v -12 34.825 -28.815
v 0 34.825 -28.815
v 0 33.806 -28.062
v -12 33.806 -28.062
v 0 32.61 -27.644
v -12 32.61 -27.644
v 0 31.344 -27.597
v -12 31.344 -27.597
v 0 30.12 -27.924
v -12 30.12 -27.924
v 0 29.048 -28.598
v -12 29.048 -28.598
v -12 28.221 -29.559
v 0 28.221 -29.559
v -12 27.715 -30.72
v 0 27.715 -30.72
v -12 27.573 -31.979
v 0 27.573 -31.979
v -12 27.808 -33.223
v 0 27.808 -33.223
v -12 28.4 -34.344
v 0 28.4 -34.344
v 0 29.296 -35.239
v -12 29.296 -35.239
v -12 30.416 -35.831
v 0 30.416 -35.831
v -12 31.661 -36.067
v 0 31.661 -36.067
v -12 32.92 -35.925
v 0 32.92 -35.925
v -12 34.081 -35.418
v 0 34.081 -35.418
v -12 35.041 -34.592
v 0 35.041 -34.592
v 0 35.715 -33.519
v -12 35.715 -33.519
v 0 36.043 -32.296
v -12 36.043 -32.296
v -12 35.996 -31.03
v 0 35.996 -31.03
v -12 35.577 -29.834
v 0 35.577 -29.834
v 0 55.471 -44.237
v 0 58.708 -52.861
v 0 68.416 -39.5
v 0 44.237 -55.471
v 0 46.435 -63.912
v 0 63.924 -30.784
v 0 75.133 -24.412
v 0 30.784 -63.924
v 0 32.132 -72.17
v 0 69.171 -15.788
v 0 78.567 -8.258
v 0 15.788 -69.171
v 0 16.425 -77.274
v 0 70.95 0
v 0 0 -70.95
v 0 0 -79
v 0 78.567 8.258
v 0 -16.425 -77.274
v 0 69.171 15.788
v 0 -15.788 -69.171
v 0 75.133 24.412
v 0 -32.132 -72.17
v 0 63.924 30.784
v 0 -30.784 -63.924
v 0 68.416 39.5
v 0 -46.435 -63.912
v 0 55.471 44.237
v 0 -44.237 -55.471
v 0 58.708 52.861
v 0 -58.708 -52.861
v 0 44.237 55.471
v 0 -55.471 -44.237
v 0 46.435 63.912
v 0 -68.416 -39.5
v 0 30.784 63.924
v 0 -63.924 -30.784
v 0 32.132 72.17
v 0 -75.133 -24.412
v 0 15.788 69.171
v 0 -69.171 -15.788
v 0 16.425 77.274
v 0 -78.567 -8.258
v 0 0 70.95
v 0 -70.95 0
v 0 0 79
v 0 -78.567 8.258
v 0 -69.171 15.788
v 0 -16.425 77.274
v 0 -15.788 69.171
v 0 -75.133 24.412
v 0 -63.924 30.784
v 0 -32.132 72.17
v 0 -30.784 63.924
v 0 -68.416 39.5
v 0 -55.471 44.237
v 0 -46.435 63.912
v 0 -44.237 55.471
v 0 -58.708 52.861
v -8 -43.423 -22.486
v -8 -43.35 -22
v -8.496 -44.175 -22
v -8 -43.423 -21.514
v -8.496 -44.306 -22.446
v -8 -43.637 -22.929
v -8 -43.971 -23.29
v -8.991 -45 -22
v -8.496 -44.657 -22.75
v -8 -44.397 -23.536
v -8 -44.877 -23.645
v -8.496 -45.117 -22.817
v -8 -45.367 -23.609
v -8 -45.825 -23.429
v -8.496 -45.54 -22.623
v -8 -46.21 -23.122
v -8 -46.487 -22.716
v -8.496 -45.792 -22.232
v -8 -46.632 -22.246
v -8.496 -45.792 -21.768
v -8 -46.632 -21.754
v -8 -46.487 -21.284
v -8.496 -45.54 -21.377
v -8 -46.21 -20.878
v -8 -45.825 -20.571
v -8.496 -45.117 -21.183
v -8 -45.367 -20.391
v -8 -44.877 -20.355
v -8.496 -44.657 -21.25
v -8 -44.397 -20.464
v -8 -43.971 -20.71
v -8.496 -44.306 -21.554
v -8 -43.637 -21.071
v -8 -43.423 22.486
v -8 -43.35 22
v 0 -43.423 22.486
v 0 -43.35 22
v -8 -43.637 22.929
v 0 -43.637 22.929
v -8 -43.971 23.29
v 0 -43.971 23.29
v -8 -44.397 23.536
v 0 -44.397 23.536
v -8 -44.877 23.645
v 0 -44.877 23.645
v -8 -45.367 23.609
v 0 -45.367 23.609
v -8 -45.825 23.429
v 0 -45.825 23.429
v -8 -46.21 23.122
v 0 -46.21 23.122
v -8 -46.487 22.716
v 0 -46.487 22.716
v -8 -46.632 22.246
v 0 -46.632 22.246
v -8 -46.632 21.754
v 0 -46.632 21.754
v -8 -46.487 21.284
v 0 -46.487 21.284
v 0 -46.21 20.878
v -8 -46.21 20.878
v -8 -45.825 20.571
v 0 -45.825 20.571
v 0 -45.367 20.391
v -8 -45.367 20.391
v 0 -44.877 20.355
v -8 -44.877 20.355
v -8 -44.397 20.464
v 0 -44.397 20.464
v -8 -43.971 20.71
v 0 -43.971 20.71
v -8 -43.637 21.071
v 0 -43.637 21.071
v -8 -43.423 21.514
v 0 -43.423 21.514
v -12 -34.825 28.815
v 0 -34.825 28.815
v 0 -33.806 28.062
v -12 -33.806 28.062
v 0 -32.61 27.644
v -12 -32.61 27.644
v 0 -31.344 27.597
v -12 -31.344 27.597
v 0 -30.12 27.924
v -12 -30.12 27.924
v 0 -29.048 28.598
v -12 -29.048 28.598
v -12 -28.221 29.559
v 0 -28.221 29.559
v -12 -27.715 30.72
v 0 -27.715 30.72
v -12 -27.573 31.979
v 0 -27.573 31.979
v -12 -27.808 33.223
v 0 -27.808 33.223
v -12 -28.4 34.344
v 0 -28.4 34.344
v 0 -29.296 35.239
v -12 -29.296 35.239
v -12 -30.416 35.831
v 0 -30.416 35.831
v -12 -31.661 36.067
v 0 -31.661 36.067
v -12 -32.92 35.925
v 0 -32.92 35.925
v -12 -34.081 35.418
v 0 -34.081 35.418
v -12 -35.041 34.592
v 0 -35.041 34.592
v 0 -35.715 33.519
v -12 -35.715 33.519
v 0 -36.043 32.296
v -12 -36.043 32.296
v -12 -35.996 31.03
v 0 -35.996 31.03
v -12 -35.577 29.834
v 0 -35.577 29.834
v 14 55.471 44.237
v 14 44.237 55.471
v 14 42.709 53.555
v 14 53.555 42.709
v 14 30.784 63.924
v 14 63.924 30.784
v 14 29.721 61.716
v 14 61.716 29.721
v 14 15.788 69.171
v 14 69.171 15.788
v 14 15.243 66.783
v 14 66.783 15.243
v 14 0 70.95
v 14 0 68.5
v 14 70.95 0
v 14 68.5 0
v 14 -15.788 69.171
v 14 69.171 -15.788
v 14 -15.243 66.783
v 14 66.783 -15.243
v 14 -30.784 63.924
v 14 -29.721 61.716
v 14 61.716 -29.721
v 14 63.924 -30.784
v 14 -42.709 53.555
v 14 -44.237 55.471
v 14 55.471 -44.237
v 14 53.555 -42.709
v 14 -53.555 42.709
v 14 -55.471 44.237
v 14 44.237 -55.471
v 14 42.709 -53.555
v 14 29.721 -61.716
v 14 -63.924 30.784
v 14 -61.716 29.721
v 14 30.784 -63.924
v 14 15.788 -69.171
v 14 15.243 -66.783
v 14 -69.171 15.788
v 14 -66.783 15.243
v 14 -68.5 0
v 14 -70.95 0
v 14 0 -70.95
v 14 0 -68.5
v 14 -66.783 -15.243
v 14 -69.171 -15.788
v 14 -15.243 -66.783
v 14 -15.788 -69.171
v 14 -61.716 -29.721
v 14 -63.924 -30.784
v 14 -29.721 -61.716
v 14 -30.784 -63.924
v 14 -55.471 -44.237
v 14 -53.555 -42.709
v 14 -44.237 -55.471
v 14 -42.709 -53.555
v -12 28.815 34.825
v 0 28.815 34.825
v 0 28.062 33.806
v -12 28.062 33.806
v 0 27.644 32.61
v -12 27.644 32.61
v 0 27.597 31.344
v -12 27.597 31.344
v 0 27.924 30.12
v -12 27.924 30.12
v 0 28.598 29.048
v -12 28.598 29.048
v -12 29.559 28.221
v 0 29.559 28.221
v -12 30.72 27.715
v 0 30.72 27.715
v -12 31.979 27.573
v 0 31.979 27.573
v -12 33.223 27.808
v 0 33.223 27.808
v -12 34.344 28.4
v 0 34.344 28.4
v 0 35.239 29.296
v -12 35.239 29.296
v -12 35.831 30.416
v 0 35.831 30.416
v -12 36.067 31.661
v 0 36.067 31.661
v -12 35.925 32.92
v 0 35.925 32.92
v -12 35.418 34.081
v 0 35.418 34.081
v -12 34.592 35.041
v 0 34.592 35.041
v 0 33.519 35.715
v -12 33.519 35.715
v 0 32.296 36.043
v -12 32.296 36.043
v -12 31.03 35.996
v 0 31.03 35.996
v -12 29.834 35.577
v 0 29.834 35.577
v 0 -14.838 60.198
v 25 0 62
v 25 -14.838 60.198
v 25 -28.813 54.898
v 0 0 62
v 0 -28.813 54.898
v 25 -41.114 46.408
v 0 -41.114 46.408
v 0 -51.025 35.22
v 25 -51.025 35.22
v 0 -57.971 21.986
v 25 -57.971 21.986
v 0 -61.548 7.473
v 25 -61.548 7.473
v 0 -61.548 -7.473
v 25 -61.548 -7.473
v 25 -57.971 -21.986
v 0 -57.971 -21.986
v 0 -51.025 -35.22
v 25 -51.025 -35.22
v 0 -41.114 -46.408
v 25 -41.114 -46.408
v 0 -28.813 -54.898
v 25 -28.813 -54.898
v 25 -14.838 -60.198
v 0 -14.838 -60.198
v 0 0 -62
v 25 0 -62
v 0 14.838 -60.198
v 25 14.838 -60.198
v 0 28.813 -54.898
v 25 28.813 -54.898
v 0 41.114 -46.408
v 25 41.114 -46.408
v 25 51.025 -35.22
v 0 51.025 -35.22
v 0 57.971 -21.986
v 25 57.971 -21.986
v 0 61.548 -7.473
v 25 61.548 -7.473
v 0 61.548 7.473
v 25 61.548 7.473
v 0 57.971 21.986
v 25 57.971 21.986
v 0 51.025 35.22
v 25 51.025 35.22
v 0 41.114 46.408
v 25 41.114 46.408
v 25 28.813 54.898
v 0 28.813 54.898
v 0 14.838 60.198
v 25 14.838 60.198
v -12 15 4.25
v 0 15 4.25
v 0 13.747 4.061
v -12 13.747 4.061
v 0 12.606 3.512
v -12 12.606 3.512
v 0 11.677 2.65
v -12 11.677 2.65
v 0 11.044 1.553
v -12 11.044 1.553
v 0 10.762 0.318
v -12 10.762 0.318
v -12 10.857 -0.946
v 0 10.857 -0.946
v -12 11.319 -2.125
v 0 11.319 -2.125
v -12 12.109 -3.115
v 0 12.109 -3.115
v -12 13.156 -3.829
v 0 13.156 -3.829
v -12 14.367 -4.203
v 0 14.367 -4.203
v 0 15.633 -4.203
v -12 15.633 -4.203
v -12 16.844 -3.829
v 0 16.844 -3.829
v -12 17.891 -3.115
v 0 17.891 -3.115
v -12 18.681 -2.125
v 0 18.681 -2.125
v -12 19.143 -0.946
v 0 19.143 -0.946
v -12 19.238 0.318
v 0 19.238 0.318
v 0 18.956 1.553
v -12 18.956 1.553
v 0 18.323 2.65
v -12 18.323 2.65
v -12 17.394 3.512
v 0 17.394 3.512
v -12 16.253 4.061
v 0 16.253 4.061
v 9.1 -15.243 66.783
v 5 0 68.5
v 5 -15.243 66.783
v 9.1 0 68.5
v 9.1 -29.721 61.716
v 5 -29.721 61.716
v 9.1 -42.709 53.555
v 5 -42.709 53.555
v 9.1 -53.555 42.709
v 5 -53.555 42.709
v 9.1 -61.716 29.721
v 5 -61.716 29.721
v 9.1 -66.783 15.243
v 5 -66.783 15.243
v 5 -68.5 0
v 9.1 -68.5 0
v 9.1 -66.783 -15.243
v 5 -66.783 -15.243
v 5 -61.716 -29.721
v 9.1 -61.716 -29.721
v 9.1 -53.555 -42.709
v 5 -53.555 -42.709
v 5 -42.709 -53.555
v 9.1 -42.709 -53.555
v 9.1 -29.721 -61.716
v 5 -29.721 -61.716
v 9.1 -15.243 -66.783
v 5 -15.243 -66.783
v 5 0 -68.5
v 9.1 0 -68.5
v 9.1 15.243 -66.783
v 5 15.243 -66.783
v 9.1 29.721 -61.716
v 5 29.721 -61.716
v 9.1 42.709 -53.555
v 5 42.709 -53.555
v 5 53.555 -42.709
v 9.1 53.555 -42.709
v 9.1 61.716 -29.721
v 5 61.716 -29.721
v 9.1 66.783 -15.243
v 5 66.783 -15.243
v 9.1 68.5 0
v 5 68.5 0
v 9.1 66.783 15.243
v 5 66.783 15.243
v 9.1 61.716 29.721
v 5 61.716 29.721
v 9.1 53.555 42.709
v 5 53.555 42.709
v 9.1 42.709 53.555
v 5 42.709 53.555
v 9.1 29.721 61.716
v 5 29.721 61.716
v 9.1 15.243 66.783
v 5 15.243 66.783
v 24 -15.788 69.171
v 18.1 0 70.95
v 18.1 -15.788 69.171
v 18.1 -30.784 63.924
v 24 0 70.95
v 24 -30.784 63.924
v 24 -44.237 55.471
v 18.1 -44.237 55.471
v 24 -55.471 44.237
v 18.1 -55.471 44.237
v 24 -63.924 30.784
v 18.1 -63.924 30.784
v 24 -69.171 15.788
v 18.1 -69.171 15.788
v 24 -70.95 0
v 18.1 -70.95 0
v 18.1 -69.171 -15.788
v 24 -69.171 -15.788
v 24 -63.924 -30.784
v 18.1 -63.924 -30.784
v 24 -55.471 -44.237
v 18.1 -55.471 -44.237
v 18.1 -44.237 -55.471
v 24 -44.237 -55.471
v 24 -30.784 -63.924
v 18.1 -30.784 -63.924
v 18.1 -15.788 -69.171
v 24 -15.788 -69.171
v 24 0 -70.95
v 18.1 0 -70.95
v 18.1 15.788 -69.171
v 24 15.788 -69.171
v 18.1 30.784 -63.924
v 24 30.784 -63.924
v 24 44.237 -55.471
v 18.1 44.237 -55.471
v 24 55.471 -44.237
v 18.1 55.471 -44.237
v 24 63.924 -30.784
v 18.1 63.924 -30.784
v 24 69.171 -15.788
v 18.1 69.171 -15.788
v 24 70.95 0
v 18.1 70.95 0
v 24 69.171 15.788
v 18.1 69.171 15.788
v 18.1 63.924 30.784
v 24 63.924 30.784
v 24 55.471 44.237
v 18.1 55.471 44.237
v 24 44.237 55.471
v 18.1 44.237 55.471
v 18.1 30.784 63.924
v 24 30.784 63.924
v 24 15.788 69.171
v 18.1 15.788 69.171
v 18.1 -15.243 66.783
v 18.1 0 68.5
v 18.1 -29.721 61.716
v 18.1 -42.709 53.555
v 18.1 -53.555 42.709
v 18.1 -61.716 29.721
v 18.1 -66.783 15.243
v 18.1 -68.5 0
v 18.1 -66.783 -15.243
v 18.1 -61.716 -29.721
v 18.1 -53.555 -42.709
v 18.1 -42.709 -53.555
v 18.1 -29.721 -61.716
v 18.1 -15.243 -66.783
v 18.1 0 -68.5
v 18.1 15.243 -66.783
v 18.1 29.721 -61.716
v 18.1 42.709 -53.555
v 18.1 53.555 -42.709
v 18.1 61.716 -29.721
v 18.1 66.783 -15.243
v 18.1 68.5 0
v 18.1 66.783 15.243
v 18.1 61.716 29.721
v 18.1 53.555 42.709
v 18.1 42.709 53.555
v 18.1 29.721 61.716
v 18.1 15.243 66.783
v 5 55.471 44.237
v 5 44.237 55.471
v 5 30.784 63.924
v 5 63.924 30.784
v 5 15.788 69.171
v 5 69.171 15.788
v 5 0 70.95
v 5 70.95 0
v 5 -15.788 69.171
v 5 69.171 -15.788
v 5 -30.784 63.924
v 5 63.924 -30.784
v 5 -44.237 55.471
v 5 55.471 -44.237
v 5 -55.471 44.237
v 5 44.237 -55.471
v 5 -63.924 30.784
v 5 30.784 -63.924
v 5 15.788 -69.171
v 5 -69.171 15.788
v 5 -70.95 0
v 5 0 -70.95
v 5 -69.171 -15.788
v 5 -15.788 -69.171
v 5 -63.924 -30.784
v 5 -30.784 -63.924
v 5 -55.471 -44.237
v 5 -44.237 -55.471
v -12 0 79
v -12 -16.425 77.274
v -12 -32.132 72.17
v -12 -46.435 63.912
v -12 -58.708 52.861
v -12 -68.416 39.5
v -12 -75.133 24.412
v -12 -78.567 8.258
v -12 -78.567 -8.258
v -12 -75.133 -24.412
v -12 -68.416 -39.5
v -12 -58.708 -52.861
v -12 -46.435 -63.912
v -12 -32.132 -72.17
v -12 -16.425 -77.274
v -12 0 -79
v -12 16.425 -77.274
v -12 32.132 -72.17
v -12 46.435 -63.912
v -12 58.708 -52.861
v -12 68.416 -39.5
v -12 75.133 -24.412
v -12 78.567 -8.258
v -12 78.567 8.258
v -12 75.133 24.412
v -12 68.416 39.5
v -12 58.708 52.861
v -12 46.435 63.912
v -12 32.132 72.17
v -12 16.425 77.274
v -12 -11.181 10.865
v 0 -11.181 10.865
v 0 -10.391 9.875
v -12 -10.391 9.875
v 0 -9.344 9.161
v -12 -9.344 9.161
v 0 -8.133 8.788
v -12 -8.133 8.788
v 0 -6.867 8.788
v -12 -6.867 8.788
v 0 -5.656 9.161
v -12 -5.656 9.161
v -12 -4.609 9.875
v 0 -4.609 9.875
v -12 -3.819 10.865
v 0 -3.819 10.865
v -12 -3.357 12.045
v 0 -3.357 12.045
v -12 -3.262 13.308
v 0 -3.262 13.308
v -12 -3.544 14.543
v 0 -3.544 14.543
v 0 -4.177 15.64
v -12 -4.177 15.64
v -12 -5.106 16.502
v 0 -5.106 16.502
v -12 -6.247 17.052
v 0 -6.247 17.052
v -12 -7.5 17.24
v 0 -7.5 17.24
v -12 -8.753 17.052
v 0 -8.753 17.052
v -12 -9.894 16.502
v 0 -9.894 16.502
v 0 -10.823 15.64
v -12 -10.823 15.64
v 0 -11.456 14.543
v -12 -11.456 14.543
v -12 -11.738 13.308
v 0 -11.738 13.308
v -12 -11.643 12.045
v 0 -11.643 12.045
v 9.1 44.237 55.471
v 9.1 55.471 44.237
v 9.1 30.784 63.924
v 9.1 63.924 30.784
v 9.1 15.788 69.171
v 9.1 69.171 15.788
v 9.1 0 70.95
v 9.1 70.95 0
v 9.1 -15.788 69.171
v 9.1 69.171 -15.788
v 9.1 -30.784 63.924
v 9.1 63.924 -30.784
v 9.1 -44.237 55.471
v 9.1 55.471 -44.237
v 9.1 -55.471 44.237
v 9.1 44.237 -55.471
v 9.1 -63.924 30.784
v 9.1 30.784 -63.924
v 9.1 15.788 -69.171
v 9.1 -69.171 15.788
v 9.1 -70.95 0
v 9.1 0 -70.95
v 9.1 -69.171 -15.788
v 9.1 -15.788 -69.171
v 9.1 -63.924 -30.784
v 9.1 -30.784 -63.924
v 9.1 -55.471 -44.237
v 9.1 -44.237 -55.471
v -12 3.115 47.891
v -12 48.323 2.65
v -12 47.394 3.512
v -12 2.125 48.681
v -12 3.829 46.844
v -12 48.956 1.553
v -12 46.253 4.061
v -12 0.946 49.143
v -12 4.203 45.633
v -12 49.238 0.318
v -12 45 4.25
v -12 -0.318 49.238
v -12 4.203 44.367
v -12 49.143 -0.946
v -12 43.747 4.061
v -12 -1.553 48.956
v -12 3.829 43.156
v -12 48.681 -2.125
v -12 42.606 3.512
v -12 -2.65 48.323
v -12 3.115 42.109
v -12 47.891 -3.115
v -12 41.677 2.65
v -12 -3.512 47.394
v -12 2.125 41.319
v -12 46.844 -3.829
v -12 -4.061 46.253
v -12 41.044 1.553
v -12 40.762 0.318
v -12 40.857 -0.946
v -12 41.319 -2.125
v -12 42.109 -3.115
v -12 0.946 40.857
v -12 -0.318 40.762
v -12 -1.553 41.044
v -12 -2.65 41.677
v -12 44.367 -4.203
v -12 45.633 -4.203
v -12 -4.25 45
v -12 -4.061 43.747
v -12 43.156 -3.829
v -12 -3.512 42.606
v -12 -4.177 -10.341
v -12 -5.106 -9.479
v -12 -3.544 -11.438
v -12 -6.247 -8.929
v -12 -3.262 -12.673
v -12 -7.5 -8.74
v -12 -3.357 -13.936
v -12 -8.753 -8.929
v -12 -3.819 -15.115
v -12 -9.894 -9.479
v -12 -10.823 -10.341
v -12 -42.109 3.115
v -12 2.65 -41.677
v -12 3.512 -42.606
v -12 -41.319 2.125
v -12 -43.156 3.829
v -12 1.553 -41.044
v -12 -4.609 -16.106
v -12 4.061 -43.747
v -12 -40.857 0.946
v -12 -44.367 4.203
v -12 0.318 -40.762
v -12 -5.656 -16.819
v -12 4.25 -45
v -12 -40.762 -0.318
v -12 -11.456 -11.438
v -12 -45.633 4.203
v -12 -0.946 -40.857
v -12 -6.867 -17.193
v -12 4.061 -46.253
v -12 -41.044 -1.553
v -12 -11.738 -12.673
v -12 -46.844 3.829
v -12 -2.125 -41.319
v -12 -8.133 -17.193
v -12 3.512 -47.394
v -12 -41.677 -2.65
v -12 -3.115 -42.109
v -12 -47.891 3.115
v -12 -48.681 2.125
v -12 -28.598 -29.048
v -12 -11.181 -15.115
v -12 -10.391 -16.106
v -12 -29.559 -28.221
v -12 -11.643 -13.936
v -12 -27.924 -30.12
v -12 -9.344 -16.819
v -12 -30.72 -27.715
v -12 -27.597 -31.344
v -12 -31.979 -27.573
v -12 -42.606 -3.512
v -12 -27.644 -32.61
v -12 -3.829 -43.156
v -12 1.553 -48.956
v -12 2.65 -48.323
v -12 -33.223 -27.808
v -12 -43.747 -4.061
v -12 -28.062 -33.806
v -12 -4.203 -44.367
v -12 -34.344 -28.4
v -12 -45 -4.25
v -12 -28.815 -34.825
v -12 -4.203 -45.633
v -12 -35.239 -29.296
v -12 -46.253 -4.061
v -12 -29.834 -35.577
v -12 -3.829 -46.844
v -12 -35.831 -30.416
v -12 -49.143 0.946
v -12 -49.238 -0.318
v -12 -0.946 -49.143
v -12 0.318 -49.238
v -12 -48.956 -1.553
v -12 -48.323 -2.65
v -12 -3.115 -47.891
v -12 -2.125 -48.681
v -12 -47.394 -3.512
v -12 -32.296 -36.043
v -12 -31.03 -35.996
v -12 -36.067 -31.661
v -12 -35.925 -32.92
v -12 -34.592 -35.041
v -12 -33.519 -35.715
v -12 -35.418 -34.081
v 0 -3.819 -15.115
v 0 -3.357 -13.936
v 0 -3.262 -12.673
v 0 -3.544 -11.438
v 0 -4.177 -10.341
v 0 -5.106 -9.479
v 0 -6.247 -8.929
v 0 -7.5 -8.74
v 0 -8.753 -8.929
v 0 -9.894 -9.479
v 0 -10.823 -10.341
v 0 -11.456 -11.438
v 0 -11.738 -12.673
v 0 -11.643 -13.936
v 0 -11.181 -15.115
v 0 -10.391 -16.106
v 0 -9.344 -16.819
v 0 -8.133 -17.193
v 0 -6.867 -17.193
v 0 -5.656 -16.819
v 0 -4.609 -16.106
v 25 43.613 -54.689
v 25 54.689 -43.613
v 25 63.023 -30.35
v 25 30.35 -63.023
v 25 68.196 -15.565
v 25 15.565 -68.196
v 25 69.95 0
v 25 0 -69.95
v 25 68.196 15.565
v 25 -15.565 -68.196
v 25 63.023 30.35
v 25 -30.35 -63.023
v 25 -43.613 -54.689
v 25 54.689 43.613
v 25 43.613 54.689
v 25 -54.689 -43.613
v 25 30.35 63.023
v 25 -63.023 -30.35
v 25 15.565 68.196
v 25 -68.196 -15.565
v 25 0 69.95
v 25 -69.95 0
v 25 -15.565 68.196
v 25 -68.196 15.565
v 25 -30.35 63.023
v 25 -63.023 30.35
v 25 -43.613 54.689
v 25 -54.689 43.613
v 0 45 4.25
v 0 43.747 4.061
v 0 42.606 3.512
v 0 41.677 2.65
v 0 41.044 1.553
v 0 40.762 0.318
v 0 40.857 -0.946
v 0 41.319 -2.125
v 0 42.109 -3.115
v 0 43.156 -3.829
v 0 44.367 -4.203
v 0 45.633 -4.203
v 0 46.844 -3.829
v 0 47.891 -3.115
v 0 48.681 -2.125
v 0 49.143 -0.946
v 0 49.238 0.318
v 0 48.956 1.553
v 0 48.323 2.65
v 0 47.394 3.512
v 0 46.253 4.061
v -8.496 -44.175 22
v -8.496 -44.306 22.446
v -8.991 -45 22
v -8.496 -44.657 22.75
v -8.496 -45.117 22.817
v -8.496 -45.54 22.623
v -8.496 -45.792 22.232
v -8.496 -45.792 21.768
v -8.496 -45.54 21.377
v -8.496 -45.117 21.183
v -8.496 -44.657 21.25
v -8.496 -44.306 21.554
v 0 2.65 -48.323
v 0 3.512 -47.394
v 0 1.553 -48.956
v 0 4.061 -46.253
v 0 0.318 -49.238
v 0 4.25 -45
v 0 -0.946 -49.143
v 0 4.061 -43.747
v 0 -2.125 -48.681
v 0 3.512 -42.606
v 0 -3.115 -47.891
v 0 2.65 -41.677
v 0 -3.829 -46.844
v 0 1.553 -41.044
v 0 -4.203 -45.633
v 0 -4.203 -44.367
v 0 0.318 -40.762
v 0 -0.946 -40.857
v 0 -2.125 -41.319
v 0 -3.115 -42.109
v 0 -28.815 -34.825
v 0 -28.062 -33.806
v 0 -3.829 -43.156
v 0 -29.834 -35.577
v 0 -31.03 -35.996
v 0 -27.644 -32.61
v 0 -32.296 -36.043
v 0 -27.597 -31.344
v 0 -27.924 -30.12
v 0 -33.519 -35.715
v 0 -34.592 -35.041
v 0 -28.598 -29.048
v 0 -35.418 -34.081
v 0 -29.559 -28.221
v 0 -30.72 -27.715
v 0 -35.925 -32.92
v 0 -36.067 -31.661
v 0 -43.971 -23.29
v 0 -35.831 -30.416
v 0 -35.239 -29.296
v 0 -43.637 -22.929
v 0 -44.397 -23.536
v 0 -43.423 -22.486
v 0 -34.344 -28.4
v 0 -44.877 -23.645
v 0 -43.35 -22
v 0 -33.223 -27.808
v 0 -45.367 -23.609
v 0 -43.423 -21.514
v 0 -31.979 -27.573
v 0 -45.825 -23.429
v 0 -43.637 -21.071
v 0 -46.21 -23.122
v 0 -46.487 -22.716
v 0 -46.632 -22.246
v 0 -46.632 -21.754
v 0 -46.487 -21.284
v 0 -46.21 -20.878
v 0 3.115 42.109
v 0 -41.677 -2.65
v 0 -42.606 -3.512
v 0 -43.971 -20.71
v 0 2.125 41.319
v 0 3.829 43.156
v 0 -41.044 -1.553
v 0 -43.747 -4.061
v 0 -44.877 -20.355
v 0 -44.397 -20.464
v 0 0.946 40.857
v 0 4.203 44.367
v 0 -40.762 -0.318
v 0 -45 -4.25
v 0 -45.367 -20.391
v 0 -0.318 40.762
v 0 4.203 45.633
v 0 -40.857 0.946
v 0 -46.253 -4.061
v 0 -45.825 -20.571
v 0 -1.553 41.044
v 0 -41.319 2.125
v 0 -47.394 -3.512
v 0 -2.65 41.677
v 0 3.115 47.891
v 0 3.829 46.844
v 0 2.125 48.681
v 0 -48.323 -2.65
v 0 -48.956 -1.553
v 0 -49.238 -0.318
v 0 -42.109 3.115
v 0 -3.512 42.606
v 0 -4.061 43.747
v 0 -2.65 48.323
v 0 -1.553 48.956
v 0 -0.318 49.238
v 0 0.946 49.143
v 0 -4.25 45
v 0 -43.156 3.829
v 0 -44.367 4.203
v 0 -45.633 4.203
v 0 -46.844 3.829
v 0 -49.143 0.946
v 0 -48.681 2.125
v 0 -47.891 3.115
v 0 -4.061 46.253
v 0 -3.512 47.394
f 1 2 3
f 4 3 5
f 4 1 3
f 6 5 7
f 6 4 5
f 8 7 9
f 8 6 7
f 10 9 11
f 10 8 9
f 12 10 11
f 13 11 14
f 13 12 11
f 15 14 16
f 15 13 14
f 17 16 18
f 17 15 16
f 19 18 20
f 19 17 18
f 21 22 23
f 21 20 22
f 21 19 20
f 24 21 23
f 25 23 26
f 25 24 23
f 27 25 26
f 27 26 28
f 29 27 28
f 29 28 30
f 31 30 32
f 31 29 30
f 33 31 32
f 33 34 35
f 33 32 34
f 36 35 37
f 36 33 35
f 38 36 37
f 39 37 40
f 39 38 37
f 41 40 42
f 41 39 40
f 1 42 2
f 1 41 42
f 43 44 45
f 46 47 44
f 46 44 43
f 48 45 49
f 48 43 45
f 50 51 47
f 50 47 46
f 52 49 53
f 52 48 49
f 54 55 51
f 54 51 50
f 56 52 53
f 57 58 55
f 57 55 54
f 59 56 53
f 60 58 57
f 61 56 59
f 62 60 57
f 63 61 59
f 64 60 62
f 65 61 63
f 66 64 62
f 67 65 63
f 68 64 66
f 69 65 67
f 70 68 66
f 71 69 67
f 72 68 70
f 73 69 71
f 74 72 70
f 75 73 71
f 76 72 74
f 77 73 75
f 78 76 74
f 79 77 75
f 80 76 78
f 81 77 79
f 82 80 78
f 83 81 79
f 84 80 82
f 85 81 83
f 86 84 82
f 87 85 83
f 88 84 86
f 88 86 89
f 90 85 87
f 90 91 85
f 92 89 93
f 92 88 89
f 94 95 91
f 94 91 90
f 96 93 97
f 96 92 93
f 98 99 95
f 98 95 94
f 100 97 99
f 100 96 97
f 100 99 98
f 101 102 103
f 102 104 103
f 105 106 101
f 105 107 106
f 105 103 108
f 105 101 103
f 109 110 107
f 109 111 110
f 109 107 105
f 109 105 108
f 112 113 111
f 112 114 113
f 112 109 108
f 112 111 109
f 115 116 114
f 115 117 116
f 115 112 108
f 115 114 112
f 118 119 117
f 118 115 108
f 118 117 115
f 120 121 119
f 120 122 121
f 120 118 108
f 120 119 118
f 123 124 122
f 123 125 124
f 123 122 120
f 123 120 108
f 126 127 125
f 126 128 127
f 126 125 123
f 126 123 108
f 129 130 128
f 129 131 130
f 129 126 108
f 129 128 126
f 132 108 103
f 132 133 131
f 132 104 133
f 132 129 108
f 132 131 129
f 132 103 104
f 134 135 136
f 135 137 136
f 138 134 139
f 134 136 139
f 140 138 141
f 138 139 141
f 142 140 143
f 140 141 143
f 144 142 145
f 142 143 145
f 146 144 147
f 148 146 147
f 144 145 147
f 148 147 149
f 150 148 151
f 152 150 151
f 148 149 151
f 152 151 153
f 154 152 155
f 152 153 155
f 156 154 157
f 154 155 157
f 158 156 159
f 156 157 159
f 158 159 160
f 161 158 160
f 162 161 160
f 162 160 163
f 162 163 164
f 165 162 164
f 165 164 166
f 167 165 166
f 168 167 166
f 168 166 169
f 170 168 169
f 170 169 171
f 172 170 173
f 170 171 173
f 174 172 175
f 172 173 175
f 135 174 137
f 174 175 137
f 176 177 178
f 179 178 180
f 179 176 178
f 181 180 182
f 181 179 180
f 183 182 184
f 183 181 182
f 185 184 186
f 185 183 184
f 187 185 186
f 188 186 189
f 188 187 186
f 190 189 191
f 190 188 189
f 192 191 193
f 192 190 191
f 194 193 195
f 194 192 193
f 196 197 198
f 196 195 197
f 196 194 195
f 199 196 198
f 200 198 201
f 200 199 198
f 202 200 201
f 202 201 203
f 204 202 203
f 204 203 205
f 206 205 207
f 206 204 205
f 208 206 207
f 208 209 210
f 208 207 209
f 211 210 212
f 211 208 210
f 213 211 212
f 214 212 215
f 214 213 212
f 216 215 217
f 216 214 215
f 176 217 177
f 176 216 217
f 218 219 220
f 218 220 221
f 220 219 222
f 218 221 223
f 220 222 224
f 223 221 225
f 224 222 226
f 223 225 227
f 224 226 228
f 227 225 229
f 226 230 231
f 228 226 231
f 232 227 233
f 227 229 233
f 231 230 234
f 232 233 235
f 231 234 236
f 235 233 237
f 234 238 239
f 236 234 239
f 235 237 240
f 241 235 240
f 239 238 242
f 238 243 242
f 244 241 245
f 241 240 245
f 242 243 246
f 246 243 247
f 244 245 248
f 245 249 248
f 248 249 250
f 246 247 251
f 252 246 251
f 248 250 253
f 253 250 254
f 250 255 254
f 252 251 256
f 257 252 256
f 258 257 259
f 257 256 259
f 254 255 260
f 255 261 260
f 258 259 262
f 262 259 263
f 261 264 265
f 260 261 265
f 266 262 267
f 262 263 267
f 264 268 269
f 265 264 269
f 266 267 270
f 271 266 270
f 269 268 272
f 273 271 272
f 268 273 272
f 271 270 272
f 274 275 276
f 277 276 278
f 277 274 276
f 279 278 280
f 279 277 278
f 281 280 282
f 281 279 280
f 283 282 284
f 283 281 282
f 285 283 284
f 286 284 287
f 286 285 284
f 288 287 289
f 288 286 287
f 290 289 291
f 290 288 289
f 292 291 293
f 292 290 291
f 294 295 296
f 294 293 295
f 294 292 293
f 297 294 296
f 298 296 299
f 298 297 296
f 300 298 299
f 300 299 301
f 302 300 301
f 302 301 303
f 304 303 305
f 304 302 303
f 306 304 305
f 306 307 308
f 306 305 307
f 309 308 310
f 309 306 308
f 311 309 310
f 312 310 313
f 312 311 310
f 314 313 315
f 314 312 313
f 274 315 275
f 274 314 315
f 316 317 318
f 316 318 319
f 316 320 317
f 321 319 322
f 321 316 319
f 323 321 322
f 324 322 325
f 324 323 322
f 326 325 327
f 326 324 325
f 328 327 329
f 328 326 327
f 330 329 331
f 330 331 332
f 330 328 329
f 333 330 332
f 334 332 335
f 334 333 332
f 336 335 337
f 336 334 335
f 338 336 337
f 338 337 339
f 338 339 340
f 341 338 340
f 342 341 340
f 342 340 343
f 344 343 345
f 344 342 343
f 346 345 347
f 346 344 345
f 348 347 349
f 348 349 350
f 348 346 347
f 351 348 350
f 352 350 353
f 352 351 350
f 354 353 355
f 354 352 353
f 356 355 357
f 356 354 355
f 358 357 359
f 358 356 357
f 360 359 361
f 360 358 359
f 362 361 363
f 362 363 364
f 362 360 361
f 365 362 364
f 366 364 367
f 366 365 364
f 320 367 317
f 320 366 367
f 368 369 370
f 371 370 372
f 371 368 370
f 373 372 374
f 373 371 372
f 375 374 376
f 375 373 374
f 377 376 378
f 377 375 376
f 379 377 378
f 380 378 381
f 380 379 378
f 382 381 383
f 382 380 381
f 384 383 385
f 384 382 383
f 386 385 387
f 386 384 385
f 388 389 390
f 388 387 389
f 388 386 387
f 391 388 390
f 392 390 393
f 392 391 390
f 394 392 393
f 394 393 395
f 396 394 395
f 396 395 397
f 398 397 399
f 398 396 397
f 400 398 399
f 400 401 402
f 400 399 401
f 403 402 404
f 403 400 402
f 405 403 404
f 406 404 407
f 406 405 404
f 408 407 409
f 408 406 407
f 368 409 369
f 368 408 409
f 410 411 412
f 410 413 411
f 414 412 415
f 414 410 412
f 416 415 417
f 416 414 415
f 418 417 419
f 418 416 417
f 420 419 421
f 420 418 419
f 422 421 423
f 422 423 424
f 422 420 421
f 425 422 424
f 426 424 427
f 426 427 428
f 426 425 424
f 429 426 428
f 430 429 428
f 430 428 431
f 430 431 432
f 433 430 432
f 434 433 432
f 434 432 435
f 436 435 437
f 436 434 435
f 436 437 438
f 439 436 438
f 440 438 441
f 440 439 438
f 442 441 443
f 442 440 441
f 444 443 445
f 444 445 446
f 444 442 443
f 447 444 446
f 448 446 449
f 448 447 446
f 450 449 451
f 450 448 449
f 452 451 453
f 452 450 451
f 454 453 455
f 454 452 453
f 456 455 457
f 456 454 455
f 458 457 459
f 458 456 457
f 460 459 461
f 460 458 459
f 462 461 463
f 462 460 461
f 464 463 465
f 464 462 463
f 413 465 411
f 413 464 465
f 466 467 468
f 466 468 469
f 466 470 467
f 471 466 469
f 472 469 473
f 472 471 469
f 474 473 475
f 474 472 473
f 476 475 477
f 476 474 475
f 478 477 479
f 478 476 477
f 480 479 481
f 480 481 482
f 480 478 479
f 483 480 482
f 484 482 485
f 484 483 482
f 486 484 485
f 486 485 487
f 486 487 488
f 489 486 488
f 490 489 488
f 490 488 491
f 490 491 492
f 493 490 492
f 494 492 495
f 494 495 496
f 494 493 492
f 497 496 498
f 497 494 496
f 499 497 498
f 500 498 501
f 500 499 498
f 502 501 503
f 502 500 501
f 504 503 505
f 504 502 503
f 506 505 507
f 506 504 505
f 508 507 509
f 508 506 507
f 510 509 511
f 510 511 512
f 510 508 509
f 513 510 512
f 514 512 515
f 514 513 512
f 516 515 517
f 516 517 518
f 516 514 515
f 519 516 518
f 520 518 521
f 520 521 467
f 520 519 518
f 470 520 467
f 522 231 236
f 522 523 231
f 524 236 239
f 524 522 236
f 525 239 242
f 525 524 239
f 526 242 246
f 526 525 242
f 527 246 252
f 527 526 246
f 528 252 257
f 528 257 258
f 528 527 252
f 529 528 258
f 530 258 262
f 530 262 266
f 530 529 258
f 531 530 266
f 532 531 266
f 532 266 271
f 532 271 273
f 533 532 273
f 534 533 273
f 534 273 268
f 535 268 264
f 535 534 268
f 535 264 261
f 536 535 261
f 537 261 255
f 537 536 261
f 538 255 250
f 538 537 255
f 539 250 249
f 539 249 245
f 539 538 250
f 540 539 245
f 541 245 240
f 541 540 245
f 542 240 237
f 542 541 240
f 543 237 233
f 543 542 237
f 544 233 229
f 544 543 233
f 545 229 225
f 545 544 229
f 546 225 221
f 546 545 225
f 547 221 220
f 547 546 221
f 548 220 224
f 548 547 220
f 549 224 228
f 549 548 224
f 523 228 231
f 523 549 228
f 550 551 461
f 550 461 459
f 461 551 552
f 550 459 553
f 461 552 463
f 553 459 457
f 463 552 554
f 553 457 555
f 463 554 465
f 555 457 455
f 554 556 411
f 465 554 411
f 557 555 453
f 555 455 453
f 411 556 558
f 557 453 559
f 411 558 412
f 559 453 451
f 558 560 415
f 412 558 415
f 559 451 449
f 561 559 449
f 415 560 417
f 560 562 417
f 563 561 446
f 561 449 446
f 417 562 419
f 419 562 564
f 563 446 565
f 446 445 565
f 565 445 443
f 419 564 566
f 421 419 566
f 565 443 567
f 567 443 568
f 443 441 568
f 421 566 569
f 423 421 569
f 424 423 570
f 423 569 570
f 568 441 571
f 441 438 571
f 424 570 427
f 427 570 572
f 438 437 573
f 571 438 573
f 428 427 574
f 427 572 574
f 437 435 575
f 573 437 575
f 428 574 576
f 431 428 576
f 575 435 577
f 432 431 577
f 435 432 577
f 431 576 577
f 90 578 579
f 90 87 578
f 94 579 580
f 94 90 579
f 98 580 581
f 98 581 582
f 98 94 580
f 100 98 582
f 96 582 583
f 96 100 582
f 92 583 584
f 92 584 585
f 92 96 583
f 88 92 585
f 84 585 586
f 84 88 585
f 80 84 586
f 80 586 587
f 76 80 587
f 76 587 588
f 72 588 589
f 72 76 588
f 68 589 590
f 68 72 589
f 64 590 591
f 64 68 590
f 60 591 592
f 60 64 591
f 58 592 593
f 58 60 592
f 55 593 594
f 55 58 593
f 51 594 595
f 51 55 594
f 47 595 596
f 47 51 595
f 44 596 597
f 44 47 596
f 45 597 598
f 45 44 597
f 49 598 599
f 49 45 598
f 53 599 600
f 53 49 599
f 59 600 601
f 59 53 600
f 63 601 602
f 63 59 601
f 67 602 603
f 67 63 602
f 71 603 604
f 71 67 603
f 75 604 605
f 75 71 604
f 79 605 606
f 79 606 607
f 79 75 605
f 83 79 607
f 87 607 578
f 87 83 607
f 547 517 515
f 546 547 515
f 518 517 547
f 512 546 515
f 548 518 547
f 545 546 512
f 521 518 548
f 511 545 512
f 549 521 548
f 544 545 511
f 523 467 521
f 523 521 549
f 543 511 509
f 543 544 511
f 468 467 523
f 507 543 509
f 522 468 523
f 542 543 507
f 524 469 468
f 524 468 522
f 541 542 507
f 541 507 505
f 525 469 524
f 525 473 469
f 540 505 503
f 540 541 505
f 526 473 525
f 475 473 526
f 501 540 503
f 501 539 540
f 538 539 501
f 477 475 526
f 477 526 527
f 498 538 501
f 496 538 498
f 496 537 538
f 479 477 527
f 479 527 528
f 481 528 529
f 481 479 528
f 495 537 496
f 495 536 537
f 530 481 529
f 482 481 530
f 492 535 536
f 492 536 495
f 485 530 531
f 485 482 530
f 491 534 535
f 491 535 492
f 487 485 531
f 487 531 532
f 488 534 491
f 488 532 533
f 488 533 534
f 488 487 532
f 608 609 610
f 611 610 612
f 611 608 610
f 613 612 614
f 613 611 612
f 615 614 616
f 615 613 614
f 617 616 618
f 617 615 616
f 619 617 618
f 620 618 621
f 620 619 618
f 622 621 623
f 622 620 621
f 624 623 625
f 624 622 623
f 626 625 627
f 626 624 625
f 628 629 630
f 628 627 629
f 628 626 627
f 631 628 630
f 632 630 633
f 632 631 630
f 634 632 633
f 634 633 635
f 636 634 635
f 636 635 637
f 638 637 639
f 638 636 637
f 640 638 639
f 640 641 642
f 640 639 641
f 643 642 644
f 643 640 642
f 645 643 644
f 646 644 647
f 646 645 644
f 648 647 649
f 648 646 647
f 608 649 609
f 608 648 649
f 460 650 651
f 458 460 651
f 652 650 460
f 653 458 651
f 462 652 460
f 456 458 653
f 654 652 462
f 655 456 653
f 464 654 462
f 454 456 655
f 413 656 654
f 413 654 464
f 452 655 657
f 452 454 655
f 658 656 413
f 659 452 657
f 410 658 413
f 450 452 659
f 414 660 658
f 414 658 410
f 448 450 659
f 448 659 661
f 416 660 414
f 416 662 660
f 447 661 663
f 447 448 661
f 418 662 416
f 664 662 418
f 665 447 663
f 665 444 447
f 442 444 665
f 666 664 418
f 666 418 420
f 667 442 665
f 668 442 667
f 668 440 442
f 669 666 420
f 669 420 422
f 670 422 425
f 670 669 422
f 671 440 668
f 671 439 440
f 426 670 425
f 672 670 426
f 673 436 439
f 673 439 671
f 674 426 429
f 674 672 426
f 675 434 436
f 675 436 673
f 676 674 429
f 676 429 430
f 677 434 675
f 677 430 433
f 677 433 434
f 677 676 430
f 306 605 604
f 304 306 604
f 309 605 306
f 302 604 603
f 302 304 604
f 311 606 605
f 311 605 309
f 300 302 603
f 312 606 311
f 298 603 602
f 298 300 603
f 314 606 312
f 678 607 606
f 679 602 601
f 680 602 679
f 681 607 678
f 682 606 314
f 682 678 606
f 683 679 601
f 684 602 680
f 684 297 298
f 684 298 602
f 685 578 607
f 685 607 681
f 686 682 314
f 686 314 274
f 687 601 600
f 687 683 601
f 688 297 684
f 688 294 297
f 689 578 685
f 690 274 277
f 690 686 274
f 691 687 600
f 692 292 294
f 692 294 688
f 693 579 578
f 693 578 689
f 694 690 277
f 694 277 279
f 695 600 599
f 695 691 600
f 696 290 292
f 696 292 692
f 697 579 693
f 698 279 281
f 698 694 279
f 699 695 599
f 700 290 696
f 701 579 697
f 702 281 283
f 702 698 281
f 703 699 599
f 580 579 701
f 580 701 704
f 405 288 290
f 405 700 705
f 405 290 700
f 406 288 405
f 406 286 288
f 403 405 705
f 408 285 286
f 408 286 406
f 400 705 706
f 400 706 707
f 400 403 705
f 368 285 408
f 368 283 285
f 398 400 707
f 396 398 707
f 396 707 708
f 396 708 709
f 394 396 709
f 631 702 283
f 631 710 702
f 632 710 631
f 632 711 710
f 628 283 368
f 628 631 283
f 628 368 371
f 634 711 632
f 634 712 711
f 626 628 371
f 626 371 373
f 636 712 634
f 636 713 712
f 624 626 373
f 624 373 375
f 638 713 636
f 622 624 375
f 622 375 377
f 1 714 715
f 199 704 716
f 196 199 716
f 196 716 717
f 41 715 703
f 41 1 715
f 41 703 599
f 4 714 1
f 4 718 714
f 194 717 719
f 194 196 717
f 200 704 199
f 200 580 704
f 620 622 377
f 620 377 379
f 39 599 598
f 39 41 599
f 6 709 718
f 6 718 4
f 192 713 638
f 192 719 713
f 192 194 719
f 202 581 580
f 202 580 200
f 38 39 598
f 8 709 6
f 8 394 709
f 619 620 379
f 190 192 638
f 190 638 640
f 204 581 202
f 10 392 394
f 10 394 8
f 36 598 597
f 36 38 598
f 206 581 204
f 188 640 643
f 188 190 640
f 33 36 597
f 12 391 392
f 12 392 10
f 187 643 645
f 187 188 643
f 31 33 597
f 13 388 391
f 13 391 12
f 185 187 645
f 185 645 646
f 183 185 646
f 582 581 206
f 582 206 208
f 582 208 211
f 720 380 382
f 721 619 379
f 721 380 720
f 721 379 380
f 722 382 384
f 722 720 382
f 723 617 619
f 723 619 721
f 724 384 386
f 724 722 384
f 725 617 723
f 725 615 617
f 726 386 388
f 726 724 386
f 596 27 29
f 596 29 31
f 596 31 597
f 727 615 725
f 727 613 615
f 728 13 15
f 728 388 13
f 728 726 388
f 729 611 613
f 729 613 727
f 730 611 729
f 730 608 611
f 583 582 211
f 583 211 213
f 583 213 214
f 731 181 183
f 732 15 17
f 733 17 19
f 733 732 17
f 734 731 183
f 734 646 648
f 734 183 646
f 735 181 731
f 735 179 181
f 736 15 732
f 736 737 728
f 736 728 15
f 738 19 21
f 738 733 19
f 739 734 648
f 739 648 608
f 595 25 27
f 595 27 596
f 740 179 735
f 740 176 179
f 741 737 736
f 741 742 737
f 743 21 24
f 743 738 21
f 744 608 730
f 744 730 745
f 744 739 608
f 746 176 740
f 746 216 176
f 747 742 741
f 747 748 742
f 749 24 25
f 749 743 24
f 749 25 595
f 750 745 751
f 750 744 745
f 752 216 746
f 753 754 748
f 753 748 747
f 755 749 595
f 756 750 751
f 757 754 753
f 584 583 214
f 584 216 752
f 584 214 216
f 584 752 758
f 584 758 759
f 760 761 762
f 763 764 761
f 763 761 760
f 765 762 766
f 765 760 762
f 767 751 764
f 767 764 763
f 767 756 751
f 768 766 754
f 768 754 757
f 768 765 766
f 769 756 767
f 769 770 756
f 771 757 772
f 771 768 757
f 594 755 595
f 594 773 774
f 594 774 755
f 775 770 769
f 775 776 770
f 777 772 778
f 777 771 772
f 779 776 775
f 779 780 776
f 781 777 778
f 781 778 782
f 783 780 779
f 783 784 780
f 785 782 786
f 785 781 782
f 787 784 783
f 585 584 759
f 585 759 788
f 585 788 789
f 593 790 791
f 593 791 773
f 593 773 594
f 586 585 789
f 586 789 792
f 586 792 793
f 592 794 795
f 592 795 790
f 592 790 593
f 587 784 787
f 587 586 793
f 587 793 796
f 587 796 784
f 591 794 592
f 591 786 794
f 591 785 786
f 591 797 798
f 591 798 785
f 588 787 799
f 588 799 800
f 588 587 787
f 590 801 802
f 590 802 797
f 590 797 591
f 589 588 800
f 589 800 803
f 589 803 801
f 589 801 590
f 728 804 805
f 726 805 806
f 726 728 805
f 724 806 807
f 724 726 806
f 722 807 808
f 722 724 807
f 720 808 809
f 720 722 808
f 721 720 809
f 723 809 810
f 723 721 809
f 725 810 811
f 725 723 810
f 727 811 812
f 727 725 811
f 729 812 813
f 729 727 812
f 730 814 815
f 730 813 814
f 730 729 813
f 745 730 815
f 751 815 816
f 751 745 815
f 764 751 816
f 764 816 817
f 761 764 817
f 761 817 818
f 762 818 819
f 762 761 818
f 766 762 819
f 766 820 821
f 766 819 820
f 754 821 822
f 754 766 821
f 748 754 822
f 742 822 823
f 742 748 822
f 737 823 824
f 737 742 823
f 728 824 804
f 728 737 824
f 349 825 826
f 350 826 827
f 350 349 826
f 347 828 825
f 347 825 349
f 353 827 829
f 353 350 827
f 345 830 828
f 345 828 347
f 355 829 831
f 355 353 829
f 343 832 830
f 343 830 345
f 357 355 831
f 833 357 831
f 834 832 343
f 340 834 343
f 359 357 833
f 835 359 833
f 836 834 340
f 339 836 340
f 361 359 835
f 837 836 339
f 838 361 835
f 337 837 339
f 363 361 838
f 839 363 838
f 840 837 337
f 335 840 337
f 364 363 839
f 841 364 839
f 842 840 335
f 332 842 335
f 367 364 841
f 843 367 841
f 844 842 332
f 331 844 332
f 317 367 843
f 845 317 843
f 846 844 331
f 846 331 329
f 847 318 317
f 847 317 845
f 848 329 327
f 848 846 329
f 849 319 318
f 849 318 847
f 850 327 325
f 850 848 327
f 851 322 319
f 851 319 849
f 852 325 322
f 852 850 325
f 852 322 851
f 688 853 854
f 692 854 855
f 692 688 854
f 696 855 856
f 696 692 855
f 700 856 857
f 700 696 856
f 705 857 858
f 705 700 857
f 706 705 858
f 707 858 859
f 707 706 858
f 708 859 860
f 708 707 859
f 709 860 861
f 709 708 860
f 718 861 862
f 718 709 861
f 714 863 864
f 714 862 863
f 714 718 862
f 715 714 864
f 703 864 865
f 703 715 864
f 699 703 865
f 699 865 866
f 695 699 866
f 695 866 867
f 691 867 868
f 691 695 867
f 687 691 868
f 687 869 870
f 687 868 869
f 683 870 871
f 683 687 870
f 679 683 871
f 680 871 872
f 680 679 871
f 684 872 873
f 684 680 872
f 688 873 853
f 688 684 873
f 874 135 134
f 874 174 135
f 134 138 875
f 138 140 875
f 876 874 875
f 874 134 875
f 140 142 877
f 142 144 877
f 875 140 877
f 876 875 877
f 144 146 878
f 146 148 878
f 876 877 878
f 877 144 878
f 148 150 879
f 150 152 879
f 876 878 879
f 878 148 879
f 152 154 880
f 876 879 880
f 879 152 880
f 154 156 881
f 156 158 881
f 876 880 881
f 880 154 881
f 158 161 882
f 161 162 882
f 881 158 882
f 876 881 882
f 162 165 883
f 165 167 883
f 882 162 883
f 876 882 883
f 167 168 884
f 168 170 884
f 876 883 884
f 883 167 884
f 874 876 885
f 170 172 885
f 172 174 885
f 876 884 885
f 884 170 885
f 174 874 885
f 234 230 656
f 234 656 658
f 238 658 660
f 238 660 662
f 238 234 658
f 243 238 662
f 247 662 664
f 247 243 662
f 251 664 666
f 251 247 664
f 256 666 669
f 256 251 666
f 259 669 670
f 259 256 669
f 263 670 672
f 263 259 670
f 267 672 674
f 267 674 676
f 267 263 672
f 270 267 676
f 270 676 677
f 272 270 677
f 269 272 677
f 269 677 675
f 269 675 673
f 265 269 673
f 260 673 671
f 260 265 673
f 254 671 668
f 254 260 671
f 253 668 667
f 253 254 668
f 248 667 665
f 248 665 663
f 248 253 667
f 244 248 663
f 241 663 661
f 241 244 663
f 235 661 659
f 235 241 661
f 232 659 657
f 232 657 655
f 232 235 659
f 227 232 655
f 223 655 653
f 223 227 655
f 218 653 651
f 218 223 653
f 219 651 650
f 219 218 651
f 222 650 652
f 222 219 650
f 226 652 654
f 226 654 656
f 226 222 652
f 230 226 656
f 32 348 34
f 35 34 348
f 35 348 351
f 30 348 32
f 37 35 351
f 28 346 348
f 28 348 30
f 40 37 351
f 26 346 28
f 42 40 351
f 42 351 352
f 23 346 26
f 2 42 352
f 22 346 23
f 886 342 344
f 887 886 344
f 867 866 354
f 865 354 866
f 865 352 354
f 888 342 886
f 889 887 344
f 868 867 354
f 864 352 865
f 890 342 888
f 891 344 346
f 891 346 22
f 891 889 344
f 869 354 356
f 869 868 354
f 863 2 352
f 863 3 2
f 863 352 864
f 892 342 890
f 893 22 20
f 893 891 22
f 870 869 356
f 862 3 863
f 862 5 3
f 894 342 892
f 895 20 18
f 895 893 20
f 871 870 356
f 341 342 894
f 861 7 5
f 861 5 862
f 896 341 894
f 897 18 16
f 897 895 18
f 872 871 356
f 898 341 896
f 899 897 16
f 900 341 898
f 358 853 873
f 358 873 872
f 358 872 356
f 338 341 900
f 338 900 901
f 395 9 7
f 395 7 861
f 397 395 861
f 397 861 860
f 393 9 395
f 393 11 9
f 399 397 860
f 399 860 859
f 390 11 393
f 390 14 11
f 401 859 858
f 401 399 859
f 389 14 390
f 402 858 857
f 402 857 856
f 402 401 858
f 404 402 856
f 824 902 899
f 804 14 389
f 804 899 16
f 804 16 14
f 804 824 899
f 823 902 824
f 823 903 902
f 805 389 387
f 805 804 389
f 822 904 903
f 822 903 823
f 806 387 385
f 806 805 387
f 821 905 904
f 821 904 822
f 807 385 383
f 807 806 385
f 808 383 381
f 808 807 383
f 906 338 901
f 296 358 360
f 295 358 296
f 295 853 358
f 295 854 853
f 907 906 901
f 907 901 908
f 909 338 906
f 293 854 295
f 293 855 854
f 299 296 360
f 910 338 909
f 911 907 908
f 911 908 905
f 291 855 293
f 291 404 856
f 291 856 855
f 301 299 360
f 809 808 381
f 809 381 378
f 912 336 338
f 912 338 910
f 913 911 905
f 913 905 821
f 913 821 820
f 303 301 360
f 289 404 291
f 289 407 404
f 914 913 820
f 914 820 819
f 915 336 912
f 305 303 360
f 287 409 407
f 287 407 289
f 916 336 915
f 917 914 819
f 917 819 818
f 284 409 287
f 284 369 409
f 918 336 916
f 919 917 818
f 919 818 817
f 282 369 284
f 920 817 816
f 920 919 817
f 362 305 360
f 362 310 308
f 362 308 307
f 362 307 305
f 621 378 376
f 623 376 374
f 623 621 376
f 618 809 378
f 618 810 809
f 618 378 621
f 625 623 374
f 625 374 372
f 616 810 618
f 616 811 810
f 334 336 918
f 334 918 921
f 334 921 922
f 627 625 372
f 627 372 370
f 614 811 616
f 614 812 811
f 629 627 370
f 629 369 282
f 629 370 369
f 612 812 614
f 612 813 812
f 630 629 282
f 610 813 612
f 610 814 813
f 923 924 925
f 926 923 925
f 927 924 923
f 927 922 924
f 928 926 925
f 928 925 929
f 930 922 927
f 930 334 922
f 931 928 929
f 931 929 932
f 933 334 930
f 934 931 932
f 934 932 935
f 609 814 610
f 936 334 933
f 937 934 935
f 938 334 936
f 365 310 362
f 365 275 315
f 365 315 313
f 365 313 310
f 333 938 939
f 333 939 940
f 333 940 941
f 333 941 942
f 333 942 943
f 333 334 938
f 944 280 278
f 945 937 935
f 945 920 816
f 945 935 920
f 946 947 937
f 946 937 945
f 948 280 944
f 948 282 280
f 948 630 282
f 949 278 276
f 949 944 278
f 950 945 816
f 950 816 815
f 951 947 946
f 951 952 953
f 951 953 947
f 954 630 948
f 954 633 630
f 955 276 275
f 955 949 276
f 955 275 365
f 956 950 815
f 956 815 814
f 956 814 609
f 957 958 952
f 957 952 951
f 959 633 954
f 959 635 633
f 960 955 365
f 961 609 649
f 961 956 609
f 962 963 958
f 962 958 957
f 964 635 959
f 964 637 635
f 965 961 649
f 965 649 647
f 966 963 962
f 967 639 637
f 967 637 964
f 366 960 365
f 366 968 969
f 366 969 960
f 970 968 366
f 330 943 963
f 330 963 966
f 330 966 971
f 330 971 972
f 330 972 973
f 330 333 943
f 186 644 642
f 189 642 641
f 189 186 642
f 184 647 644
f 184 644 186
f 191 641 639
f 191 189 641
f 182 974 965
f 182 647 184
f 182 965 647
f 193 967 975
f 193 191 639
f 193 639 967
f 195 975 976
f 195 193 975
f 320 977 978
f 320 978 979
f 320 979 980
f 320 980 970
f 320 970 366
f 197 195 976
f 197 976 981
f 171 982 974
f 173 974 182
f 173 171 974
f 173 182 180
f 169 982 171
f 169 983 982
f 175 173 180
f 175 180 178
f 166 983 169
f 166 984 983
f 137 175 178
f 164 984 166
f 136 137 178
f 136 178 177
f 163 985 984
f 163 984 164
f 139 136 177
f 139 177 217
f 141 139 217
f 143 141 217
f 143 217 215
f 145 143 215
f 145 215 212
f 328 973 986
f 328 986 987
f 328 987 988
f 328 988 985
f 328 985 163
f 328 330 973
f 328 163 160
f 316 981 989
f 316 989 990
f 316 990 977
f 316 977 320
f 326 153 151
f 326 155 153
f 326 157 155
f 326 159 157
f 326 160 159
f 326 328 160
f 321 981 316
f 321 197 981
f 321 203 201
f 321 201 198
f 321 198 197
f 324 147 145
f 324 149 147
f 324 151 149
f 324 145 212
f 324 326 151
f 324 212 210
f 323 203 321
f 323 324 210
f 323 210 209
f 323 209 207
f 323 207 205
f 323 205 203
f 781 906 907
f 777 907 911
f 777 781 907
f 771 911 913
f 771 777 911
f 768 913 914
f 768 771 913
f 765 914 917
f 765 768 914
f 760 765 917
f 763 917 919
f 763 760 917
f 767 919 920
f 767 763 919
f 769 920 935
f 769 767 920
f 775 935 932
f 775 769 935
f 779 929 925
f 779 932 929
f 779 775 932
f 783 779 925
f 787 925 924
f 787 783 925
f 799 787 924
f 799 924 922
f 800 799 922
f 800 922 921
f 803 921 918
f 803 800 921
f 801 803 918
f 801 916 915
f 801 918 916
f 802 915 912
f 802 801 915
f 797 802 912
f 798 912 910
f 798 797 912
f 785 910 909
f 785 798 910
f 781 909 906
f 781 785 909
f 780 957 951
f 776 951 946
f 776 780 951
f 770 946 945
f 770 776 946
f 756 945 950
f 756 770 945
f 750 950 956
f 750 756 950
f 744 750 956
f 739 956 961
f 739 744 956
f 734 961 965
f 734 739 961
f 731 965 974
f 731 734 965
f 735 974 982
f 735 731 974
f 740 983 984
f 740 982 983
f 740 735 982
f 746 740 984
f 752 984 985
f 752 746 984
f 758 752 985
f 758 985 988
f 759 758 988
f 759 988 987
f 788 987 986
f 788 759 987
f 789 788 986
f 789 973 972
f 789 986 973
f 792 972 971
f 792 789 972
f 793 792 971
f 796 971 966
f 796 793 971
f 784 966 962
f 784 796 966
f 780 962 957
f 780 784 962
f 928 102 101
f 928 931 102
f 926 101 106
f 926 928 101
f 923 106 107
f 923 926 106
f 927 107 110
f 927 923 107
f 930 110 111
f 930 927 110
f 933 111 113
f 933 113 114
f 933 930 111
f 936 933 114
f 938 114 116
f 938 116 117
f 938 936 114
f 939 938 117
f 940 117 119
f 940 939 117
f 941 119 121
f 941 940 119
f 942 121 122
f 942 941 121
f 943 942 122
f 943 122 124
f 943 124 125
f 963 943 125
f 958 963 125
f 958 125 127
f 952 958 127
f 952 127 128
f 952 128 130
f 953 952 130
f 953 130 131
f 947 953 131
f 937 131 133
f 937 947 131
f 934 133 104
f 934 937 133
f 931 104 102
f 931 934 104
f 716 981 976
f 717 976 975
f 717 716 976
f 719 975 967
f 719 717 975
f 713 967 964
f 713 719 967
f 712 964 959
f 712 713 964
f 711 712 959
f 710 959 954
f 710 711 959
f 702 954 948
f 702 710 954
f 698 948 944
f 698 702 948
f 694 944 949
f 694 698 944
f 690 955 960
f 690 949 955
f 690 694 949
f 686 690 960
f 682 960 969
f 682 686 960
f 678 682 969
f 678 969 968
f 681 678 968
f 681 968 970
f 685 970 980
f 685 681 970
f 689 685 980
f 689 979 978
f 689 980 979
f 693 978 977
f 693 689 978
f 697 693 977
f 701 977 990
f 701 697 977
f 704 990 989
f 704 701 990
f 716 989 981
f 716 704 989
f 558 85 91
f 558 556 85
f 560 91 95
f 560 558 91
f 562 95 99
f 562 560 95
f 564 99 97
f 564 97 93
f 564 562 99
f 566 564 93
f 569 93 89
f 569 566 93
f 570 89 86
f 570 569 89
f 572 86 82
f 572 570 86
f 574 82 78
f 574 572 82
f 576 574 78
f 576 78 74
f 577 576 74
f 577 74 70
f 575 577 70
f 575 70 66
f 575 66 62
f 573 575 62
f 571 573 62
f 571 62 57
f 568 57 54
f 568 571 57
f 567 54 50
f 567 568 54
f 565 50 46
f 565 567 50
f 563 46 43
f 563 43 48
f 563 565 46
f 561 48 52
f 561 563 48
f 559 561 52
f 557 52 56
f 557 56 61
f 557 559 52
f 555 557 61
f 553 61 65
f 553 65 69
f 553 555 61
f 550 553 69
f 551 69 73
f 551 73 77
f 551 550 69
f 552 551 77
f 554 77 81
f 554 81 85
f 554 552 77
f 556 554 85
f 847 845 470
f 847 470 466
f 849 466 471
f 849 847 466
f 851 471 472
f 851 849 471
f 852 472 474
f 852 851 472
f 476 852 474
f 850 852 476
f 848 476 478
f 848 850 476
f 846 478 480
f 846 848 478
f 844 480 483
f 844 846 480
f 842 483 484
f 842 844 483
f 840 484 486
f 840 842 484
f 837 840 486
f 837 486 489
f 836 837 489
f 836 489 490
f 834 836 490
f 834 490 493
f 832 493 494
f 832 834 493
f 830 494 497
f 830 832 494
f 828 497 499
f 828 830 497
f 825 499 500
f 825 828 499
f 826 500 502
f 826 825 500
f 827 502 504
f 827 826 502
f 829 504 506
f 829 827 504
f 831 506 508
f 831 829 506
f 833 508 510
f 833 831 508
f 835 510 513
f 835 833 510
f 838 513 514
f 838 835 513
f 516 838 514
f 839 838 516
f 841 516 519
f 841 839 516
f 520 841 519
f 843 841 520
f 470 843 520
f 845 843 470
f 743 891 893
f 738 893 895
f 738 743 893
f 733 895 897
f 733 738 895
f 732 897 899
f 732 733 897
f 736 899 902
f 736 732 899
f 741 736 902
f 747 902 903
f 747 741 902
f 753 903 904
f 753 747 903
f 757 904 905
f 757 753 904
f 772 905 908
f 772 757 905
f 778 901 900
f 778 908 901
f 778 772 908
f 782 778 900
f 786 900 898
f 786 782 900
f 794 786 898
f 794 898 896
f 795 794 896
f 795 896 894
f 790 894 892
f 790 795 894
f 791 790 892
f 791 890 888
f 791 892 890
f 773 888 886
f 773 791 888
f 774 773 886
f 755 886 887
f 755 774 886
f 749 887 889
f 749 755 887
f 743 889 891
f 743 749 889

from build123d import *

# Parameters (mm, degrees)
CHAMFER_963_SIZE             = 1
SKETCH_2_W                   = 4.1
SKETCH_2_H                   = 2.45
PATTERN_LINEAR_O_2_COUNT     = 2
PATTERN_LINEAR_O_2_PITCH     = 9
PATTERN_CIRCULAR_M10_COUNT   = 8
PATTERN_CIRCULAR_M10_2_COUNT = 3


# Read off the part's stored shape, not the designer's step: トレイ支柱 M4（内側）
with BuildPart() as part:
    # ｽｹｯﾁ1 → Revolve 926 (revolve)
    with BuildSketch(Plane.XY, mode=Mode.PRIVATE) as revolve_926_sk:
        Polygon((-12, 0), (-12, 79), (0, 79), (0, 70.95), (25, 70.95), (25, 62), (0, 62), (0, 0), align=None)
    revolve(revolve_926_sk.sketch.rotate(Axis((0, 0, 0), (1, 0, 0)), 90), axis=Axis((0, 0, 0), (1, 0, 0)))

    # Chamfer 963
    chamfer_963_edges = [part.edges().sort_by_distance(p)[0] for p in [
        (25, 0, -70.95),
    ]]
    chamfer(chamfer_963_edges, length=CHAMFER_963_SIZE)

    # ｽｹｯﾁ2 → Oリング溝入れ G-135 (revolve, cut)
    with BuildSketch(Plane.XY, mode=Mode.PRIVATE) as o_g_135_sk:
        with Locations((7.05, 69.725)):
            Rectangle(SKETCH_2_W, SKETCH_2_H)
    o_g_135 = revolve(o_g_135_sk.sketch.rotate(Axis((0, 0, 0), (1, 0, 0)), 90), axis=Axis((0, 0, 0), (1, 0, 0)), mode=Mode.SUBTRACT)

    # Oリング溝 2 本目: Oリング溝入れ G-135 ×2
    with Locations(*[(i * PATTERN_LINEAR_O_2_PITCH, 0, 0) for i in range(1, PATTERN_LINEAR_O_2_COUNT)]):
        add(o_g_135, mode=Mode.SUBTRACT)

    # ｽｹｯﾁ3 → Hole Wizard M10 (revolve, cut)
    with BuildSketch(Plane(origin=(-12, 45, 0), x_dir=(0, 0, 1), z_dir=(0, 1, 0))):
        Polygon((0, 0), (0, 15.553657631), (4.25, 13), (4.25, 0), align=None)
    hole_wizard_m10 = revolve(axis=Axis((-18.35, 45, 0), (1, 0, 0)), mode=Mode.SUBTRACT)

    # Pattern Circular M10: Hole Wizard M10 ×8 about axis
    pattern_circular_m10_axis = Axis((0, 0, 0), (1, 0, 0))
    for i in range(1, PATTERN_CIRCULAR_M10_COUNT):
        add(hole_wizard_m10.rotate(pattern_circular_m10_axis, i * 360 / PATTERN_CIRCULAR_M10_COUNT), mode=Mode.SUBTRACT)

    # ｽｹｯﾁ5 → Hole Wizard M10 2 (revolve, cut)
    with BuildSketch(Plane(origin=(-12, 15, 0), x_dir=(0, 0, 1), z_dir=(0, 1, 0))):
        Polygon((0, 0), (0, 15.553657631), (4.25, 13), (4.25, 0), align=None)
    hole_wizard_m10_2 = revolve(axis=Axis((-18.35, 15, 0), (1, 0, 0)), mode=Mode.SUBTRACT)

    # Pattern Circular M10 2: Hole Wizard M10 2 ×3 about axis
    pattern_circular_m10_2_axis = Axis((0, 0, 0), (1, 0, 0))
    for i in range(1, PATTERN_CIRCULAR_M10_2_COUNT):
        add(hole_wizard_m10_2.rotate(pattern_circular_m10_2_axis, i * 360 / PATTERN_CIRCULAR_M10_2_COUNT), mode=Mode.SUBTRACT)

    # トレイ支柱 M4（内側） outline → トレイ支柱 M4（内側） (revolve, cut)
    with BuildSketch(Plane(origin=(0, -45, 22), x_dir=(0, 1, 0), z_dir=(0, 0, -1))):
        Polygon((0, 0), (0, -8.991420021), (1.65, -8), (1.65, 0), align=None)
    hole_wizard_m4 = revolve(axis=Axis((0, -45, 22), (1, 0, 0)), mode=Mode.SUBTRACT)

    # トレイ支柱 M4（内側・対称）: トレイ支柱 M4（内側） across plane
    add(hole_wizard_m4.mirror(Plane.XY), mode=Mode.SUBTRACT)


solid = part.part
